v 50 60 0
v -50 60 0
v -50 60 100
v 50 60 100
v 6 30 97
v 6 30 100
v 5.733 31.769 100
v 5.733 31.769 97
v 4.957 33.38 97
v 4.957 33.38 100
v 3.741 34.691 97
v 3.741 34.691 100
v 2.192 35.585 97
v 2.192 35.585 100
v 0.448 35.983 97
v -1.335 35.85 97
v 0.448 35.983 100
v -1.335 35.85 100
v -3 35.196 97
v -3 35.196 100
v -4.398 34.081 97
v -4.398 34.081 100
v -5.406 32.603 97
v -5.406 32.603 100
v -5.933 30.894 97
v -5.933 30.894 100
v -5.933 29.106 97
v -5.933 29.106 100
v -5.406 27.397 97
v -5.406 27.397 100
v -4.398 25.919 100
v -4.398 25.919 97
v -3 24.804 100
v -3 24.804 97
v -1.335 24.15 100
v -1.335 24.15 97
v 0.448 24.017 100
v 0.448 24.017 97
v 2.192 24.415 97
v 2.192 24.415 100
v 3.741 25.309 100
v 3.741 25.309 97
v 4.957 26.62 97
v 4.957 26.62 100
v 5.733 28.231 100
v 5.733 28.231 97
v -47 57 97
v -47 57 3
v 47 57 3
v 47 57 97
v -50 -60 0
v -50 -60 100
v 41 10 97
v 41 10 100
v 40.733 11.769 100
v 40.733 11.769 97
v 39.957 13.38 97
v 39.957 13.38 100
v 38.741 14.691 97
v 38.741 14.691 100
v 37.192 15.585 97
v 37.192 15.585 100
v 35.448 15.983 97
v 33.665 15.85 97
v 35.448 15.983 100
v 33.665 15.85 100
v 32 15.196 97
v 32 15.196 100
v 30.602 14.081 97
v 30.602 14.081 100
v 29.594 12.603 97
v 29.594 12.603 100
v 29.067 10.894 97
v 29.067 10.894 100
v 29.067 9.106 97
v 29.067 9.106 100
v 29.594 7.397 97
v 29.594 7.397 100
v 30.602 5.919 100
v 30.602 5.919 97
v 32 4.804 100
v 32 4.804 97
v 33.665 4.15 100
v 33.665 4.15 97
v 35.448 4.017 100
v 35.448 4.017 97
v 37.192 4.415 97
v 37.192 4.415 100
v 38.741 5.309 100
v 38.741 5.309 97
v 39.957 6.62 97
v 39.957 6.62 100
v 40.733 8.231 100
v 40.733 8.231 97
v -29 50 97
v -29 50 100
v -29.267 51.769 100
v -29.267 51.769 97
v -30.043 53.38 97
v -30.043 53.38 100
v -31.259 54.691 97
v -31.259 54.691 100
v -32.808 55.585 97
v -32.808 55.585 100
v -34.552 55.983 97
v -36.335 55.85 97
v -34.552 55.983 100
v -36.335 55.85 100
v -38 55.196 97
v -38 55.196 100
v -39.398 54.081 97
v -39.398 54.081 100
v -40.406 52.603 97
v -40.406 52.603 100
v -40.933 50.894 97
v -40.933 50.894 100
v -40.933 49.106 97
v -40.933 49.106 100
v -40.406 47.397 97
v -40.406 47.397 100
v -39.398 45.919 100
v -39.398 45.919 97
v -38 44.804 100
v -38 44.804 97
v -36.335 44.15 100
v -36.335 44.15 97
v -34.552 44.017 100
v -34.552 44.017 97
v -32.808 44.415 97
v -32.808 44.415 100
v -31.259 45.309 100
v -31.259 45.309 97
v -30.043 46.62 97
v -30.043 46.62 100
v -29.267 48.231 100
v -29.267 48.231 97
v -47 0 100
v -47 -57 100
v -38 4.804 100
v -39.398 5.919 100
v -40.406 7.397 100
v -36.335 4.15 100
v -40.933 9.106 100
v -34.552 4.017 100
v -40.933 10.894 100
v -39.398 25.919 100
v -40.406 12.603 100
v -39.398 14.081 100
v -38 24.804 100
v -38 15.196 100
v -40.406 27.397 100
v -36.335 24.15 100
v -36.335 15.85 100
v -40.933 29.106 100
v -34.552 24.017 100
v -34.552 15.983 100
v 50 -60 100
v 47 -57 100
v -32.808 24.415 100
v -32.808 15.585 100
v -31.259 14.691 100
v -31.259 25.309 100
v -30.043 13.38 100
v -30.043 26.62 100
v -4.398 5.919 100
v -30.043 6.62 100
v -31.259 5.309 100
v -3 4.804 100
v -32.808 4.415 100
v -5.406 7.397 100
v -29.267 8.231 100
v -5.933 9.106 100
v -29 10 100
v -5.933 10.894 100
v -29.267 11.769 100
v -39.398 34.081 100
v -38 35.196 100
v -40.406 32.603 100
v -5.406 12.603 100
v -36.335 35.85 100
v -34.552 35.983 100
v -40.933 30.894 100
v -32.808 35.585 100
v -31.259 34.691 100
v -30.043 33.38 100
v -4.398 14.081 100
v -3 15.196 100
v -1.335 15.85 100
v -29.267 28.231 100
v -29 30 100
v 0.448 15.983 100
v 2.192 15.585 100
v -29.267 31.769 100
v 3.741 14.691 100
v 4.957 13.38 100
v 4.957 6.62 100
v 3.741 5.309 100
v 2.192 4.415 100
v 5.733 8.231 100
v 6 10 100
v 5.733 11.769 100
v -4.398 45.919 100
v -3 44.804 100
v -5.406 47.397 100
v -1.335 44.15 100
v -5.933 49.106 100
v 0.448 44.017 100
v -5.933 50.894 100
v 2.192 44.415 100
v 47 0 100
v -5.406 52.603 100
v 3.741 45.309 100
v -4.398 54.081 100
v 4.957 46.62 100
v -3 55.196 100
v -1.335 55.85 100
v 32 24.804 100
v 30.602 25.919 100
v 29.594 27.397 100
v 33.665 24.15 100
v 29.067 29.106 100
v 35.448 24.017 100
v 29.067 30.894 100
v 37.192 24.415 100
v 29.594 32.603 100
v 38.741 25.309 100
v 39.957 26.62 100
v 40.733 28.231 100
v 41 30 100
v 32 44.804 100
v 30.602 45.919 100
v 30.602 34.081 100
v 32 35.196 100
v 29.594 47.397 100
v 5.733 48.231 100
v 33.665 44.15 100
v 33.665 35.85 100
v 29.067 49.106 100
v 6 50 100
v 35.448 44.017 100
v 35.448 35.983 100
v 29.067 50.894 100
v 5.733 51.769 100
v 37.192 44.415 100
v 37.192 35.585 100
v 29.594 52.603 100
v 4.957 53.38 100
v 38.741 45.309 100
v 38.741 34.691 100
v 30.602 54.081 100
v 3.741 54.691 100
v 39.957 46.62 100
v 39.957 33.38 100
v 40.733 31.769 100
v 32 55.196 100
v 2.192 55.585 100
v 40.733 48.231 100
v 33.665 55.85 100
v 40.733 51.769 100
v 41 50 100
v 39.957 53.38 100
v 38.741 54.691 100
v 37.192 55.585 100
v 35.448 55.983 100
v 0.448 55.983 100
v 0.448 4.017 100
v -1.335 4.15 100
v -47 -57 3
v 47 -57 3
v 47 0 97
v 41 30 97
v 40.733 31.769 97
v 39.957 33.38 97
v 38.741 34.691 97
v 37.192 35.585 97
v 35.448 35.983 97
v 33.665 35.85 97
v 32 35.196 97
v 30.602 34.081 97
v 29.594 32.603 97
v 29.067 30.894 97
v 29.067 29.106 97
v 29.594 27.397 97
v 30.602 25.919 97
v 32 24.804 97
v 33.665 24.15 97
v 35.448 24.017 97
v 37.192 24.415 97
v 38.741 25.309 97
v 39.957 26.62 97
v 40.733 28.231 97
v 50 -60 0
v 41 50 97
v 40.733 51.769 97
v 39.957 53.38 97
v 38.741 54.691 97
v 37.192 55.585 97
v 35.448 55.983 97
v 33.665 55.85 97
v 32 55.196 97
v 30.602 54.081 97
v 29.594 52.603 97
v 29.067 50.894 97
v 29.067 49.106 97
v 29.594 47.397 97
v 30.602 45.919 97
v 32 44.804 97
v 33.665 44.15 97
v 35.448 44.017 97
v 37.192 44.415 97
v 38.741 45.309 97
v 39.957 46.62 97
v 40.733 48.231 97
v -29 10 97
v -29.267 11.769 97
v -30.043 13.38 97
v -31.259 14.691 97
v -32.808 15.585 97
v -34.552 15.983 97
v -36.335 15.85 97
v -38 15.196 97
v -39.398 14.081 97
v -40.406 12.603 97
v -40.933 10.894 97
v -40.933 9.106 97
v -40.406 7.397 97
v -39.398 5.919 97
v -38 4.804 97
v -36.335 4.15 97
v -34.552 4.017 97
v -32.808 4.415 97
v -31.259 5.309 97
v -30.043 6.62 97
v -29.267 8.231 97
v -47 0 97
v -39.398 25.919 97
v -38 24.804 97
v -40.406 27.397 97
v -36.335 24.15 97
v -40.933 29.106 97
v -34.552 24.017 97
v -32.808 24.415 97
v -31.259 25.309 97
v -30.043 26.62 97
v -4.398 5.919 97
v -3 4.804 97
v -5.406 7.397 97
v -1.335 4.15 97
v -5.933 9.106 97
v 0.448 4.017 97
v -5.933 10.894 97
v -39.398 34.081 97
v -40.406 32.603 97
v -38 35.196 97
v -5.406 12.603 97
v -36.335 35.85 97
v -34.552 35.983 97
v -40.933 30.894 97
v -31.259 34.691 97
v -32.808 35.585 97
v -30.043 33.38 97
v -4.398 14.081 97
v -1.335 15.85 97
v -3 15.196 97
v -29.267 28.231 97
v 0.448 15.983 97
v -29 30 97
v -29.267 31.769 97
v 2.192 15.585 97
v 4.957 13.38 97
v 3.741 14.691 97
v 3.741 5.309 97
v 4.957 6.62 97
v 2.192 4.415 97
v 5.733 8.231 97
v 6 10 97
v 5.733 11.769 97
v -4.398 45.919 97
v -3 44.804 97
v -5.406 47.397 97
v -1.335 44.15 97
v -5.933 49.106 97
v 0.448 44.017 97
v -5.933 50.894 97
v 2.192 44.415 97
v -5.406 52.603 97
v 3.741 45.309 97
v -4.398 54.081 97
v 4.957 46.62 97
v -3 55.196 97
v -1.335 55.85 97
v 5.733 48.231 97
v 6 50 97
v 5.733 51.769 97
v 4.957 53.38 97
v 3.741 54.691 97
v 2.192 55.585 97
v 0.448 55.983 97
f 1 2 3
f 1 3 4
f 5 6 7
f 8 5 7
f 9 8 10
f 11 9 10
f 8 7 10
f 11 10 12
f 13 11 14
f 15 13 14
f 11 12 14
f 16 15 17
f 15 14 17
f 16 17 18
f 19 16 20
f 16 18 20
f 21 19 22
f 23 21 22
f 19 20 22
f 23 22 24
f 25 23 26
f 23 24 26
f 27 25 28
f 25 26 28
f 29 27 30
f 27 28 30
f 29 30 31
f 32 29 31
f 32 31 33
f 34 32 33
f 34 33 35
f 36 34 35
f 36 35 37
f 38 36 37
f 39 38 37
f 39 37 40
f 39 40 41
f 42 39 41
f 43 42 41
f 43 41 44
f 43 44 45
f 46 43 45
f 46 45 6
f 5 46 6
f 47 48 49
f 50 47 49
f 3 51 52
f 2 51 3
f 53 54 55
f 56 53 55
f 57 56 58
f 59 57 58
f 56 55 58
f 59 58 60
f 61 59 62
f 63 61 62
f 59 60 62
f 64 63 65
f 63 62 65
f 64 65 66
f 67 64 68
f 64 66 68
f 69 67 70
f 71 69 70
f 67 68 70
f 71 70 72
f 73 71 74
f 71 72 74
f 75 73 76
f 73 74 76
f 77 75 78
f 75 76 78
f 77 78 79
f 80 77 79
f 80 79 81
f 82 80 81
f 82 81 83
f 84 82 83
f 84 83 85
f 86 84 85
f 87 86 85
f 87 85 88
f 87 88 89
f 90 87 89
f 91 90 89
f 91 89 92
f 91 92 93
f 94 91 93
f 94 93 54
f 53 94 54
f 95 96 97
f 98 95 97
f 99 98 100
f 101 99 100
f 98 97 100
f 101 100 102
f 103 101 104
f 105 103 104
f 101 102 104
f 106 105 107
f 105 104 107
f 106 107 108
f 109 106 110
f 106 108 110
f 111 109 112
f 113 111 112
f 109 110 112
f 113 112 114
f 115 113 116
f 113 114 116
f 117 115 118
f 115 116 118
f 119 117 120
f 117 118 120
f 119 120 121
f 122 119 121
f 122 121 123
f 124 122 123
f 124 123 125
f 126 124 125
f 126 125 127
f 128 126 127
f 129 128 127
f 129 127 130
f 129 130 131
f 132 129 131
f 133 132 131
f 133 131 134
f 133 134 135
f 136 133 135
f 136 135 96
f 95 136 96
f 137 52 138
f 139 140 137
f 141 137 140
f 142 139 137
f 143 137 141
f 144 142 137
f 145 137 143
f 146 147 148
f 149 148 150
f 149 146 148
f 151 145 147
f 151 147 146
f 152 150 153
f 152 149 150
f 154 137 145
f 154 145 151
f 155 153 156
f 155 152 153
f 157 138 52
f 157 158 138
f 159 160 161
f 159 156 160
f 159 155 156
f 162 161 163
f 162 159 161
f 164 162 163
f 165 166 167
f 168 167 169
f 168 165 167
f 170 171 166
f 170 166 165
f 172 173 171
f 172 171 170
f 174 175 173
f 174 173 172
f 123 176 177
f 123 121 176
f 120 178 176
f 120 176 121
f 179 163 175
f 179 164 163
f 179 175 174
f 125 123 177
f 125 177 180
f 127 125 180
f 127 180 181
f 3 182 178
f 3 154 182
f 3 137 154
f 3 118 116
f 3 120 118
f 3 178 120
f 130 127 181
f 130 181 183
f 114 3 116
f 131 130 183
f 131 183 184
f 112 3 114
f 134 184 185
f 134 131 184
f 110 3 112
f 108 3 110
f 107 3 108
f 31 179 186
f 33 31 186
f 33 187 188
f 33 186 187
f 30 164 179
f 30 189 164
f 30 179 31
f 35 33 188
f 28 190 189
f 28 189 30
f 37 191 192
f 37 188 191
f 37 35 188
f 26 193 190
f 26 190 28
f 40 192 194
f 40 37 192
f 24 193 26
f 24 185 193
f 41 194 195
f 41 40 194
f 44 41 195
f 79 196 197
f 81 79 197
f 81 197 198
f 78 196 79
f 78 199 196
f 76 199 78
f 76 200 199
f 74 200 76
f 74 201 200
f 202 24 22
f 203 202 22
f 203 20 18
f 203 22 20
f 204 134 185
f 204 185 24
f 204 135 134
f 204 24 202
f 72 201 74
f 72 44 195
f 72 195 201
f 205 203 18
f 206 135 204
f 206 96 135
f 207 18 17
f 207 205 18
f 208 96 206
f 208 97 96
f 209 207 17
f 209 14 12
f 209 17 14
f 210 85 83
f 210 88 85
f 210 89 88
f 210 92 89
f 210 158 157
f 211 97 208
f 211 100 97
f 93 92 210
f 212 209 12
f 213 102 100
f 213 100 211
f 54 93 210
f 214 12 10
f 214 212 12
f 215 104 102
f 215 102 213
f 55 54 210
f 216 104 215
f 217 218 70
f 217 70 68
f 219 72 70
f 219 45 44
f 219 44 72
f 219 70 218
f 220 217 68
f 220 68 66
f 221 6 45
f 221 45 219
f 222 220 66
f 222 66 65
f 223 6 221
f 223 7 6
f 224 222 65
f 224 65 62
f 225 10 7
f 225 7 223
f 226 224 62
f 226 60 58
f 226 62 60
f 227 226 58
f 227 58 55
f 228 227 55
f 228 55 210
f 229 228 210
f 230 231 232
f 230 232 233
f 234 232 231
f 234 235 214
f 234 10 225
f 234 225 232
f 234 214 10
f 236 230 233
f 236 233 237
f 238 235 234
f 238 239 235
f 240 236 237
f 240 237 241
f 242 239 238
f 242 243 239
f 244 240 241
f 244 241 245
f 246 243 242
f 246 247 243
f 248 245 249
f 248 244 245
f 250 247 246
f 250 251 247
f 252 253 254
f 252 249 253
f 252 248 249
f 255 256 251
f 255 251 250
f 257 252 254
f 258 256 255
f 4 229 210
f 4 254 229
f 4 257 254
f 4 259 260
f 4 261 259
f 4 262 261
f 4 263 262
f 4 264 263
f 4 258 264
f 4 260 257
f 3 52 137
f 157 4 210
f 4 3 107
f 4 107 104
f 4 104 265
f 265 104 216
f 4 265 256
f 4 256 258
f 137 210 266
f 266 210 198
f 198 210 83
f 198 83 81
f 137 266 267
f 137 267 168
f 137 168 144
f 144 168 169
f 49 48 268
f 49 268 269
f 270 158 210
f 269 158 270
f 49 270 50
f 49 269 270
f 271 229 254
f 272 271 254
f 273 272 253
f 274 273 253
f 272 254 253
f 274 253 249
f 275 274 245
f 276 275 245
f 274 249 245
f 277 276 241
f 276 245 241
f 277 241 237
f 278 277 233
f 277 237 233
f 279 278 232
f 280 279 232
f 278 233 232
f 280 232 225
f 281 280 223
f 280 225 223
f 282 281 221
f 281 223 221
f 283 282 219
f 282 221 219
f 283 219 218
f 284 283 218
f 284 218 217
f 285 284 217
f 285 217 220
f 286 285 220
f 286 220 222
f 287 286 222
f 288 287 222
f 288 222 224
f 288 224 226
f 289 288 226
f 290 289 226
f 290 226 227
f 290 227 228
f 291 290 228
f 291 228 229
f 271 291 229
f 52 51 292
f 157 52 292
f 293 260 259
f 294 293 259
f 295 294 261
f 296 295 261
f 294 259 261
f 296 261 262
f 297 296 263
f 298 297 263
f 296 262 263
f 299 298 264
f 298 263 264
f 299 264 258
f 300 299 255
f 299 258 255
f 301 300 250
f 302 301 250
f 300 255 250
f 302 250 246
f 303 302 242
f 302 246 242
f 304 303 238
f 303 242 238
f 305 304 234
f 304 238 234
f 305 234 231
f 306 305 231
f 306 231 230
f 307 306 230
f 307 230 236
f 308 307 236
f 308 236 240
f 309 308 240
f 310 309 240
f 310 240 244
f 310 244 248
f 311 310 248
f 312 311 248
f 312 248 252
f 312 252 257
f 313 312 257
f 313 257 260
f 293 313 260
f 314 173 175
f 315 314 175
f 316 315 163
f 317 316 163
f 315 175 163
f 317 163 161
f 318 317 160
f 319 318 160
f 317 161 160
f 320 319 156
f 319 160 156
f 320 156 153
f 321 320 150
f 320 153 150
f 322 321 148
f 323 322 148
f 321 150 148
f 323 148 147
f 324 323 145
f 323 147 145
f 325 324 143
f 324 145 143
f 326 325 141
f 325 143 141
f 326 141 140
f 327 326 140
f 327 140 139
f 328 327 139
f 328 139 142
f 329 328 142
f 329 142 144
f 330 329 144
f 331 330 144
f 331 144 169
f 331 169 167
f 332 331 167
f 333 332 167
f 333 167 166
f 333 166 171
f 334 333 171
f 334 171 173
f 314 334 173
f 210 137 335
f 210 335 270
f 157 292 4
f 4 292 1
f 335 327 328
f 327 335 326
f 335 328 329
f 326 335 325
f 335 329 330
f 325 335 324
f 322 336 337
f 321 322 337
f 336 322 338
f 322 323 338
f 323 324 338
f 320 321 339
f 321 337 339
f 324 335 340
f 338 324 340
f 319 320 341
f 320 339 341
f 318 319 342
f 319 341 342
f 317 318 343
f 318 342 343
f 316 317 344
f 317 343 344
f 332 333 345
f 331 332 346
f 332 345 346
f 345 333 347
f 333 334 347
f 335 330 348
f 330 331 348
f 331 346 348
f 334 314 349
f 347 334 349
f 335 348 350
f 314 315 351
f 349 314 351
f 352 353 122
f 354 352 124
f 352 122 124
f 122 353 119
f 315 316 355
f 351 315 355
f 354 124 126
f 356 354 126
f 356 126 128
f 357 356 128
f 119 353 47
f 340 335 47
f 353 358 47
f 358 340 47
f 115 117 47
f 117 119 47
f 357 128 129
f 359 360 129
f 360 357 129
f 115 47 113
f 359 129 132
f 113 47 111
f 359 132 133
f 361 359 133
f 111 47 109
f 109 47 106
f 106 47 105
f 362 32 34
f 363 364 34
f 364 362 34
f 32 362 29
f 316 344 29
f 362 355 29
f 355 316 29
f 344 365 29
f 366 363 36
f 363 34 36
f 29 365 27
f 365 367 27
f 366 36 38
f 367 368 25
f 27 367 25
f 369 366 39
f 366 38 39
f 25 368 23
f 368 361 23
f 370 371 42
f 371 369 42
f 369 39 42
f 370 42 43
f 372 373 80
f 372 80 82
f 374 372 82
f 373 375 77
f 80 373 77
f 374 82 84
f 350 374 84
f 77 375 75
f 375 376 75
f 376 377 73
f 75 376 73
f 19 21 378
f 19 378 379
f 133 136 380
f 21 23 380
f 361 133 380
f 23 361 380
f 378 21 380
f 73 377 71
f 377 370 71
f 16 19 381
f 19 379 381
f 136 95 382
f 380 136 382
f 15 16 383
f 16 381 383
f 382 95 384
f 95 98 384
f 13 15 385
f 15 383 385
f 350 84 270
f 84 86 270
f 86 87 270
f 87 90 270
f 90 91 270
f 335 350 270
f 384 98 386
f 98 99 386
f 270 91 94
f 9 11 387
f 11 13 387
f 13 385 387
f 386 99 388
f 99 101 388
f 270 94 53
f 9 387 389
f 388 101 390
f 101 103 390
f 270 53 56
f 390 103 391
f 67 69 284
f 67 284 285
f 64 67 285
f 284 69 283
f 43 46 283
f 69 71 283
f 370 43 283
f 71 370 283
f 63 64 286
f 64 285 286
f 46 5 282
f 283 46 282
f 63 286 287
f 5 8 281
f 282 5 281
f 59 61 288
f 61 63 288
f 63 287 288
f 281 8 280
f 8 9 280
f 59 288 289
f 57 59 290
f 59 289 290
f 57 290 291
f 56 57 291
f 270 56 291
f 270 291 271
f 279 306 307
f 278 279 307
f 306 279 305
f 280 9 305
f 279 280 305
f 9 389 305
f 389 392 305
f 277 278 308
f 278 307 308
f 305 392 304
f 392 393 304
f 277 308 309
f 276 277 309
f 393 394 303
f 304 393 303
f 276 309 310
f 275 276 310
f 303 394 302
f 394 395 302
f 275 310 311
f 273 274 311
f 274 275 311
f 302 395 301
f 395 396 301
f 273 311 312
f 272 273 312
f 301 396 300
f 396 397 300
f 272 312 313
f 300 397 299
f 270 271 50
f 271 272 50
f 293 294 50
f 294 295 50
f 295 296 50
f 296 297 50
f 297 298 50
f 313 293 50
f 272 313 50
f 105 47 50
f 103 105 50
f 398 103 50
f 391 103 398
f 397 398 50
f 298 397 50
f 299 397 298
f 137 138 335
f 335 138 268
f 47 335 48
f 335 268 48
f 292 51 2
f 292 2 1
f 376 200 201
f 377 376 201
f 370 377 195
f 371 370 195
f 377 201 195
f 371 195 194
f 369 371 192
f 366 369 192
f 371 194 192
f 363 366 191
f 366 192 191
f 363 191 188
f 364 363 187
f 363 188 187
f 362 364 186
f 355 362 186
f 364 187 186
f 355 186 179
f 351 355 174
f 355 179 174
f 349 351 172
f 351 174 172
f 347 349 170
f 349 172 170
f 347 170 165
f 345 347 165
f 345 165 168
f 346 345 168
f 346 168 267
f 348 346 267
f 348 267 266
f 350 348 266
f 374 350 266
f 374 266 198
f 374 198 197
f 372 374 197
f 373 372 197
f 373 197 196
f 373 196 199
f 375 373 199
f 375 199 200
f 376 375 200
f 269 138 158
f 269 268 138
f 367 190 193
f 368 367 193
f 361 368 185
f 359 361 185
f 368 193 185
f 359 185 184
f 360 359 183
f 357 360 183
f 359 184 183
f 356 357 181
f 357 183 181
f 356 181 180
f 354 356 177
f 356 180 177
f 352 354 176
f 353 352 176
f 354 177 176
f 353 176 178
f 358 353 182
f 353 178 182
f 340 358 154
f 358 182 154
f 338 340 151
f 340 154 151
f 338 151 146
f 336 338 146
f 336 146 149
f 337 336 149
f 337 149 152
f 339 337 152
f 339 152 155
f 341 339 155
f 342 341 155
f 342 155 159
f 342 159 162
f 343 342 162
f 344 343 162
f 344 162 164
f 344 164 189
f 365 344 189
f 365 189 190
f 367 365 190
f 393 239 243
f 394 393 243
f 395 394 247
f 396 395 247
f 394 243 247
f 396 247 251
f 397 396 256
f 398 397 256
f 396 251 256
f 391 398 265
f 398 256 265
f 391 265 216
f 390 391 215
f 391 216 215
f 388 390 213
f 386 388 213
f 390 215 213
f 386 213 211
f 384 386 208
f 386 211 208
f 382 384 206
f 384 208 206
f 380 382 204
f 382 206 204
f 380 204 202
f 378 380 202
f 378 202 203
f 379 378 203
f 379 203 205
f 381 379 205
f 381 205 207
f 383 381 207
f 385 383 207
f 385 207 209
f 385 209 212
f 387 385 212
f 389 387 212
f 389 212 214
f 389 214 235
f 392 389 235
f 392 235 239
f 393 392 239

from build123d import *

# Parameters (mm, degrees)
F0_W     = 100
F0_H     = 120
F1_DEPTH = 100
F2_T     = -3
F3_W     = 100
F3_H     = 60
F4_DEPTH = 3
F5_R     = 6
F6_DEPTH = 25


with BuildPart() as f1:
    # F0 (on Top) → F1 (new body)
    with BuildSketch(Plane.XY):
        Rectangle(F0_W, F0_H)
    extrude(amount=F1_DEPTH)

    # F2
    f2_openings = [f1.faces().sort_by_distance(p)[0] for p in [
        (0, 0, 100),
    ]]
    offset(amount=F2_T, openings=f2_openings)

    # F3 (on face) → F4 (join)
    with BuildSketch(Plane.XY.offset(100)):
        with Locations((0, 30)):
            Rectangle(F3_W, F3_H)
    extrude(amount=-F4_DEPTH)

    # F5 (on face) → F6 (cut)
    with BuildSketch(Plane.XY.offset(100)):
        with Locations((0, 30)):
            Circle(F5_R)
        with Locations((35, 30)):
            Circle(F5_R)
        with Locations((-35, 30)):
            Circle(F5_R)
        with Locations((-35, 50)):
            Circle(F5_R)
        with Locations((0, 50)):
            Circle(F5_R)
        with Locations((35, 50)):
            Circle(F5_R)
        with Locations((-35, 10)):
            Circle(F5_R)
        with Locations((0, 10)):
            Circle(F5_R)
        with Locations((35, 10)):
            Circle(F5_R)
    extrude(amount=-F6_DEPTH, mode=Mode.SUBTRACT)


solid = f1.part
